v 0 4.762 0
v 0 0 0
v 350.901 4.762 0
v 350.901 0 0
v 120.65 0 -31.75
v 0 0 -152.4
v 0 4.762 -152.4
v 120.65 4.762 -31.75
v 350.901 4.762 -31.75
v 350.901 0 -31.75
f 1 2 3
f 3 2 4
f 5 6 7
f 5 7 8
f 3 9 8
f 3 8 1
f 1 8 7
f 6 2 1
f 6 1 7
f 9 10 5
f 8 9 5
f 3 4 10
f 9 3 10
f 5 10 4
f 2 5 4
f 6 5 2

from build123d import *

# Parameters (mm, degrees)
BOSS_EXTRUDE1_DEPTH = 4.7625


with BuildPart() as part:
    # Sketch1 → Boss-Extrude1 (new body)
    with BuildSketch(Plane(origin=(0, 0, 0), x_dir=(1, 0, 0), z_dir=(0, 1, 0))):
        Polygon((152.4, 0), (0, 0), (0, 152.4), align=None)
        Polygon((120.65, 31.75), (152.4, 0), (350.901, 0), (350.901, 31.75), align=None)
    extrude(amount=BOSS_EXTRUDE1_DEPTH)


solid = part.part
